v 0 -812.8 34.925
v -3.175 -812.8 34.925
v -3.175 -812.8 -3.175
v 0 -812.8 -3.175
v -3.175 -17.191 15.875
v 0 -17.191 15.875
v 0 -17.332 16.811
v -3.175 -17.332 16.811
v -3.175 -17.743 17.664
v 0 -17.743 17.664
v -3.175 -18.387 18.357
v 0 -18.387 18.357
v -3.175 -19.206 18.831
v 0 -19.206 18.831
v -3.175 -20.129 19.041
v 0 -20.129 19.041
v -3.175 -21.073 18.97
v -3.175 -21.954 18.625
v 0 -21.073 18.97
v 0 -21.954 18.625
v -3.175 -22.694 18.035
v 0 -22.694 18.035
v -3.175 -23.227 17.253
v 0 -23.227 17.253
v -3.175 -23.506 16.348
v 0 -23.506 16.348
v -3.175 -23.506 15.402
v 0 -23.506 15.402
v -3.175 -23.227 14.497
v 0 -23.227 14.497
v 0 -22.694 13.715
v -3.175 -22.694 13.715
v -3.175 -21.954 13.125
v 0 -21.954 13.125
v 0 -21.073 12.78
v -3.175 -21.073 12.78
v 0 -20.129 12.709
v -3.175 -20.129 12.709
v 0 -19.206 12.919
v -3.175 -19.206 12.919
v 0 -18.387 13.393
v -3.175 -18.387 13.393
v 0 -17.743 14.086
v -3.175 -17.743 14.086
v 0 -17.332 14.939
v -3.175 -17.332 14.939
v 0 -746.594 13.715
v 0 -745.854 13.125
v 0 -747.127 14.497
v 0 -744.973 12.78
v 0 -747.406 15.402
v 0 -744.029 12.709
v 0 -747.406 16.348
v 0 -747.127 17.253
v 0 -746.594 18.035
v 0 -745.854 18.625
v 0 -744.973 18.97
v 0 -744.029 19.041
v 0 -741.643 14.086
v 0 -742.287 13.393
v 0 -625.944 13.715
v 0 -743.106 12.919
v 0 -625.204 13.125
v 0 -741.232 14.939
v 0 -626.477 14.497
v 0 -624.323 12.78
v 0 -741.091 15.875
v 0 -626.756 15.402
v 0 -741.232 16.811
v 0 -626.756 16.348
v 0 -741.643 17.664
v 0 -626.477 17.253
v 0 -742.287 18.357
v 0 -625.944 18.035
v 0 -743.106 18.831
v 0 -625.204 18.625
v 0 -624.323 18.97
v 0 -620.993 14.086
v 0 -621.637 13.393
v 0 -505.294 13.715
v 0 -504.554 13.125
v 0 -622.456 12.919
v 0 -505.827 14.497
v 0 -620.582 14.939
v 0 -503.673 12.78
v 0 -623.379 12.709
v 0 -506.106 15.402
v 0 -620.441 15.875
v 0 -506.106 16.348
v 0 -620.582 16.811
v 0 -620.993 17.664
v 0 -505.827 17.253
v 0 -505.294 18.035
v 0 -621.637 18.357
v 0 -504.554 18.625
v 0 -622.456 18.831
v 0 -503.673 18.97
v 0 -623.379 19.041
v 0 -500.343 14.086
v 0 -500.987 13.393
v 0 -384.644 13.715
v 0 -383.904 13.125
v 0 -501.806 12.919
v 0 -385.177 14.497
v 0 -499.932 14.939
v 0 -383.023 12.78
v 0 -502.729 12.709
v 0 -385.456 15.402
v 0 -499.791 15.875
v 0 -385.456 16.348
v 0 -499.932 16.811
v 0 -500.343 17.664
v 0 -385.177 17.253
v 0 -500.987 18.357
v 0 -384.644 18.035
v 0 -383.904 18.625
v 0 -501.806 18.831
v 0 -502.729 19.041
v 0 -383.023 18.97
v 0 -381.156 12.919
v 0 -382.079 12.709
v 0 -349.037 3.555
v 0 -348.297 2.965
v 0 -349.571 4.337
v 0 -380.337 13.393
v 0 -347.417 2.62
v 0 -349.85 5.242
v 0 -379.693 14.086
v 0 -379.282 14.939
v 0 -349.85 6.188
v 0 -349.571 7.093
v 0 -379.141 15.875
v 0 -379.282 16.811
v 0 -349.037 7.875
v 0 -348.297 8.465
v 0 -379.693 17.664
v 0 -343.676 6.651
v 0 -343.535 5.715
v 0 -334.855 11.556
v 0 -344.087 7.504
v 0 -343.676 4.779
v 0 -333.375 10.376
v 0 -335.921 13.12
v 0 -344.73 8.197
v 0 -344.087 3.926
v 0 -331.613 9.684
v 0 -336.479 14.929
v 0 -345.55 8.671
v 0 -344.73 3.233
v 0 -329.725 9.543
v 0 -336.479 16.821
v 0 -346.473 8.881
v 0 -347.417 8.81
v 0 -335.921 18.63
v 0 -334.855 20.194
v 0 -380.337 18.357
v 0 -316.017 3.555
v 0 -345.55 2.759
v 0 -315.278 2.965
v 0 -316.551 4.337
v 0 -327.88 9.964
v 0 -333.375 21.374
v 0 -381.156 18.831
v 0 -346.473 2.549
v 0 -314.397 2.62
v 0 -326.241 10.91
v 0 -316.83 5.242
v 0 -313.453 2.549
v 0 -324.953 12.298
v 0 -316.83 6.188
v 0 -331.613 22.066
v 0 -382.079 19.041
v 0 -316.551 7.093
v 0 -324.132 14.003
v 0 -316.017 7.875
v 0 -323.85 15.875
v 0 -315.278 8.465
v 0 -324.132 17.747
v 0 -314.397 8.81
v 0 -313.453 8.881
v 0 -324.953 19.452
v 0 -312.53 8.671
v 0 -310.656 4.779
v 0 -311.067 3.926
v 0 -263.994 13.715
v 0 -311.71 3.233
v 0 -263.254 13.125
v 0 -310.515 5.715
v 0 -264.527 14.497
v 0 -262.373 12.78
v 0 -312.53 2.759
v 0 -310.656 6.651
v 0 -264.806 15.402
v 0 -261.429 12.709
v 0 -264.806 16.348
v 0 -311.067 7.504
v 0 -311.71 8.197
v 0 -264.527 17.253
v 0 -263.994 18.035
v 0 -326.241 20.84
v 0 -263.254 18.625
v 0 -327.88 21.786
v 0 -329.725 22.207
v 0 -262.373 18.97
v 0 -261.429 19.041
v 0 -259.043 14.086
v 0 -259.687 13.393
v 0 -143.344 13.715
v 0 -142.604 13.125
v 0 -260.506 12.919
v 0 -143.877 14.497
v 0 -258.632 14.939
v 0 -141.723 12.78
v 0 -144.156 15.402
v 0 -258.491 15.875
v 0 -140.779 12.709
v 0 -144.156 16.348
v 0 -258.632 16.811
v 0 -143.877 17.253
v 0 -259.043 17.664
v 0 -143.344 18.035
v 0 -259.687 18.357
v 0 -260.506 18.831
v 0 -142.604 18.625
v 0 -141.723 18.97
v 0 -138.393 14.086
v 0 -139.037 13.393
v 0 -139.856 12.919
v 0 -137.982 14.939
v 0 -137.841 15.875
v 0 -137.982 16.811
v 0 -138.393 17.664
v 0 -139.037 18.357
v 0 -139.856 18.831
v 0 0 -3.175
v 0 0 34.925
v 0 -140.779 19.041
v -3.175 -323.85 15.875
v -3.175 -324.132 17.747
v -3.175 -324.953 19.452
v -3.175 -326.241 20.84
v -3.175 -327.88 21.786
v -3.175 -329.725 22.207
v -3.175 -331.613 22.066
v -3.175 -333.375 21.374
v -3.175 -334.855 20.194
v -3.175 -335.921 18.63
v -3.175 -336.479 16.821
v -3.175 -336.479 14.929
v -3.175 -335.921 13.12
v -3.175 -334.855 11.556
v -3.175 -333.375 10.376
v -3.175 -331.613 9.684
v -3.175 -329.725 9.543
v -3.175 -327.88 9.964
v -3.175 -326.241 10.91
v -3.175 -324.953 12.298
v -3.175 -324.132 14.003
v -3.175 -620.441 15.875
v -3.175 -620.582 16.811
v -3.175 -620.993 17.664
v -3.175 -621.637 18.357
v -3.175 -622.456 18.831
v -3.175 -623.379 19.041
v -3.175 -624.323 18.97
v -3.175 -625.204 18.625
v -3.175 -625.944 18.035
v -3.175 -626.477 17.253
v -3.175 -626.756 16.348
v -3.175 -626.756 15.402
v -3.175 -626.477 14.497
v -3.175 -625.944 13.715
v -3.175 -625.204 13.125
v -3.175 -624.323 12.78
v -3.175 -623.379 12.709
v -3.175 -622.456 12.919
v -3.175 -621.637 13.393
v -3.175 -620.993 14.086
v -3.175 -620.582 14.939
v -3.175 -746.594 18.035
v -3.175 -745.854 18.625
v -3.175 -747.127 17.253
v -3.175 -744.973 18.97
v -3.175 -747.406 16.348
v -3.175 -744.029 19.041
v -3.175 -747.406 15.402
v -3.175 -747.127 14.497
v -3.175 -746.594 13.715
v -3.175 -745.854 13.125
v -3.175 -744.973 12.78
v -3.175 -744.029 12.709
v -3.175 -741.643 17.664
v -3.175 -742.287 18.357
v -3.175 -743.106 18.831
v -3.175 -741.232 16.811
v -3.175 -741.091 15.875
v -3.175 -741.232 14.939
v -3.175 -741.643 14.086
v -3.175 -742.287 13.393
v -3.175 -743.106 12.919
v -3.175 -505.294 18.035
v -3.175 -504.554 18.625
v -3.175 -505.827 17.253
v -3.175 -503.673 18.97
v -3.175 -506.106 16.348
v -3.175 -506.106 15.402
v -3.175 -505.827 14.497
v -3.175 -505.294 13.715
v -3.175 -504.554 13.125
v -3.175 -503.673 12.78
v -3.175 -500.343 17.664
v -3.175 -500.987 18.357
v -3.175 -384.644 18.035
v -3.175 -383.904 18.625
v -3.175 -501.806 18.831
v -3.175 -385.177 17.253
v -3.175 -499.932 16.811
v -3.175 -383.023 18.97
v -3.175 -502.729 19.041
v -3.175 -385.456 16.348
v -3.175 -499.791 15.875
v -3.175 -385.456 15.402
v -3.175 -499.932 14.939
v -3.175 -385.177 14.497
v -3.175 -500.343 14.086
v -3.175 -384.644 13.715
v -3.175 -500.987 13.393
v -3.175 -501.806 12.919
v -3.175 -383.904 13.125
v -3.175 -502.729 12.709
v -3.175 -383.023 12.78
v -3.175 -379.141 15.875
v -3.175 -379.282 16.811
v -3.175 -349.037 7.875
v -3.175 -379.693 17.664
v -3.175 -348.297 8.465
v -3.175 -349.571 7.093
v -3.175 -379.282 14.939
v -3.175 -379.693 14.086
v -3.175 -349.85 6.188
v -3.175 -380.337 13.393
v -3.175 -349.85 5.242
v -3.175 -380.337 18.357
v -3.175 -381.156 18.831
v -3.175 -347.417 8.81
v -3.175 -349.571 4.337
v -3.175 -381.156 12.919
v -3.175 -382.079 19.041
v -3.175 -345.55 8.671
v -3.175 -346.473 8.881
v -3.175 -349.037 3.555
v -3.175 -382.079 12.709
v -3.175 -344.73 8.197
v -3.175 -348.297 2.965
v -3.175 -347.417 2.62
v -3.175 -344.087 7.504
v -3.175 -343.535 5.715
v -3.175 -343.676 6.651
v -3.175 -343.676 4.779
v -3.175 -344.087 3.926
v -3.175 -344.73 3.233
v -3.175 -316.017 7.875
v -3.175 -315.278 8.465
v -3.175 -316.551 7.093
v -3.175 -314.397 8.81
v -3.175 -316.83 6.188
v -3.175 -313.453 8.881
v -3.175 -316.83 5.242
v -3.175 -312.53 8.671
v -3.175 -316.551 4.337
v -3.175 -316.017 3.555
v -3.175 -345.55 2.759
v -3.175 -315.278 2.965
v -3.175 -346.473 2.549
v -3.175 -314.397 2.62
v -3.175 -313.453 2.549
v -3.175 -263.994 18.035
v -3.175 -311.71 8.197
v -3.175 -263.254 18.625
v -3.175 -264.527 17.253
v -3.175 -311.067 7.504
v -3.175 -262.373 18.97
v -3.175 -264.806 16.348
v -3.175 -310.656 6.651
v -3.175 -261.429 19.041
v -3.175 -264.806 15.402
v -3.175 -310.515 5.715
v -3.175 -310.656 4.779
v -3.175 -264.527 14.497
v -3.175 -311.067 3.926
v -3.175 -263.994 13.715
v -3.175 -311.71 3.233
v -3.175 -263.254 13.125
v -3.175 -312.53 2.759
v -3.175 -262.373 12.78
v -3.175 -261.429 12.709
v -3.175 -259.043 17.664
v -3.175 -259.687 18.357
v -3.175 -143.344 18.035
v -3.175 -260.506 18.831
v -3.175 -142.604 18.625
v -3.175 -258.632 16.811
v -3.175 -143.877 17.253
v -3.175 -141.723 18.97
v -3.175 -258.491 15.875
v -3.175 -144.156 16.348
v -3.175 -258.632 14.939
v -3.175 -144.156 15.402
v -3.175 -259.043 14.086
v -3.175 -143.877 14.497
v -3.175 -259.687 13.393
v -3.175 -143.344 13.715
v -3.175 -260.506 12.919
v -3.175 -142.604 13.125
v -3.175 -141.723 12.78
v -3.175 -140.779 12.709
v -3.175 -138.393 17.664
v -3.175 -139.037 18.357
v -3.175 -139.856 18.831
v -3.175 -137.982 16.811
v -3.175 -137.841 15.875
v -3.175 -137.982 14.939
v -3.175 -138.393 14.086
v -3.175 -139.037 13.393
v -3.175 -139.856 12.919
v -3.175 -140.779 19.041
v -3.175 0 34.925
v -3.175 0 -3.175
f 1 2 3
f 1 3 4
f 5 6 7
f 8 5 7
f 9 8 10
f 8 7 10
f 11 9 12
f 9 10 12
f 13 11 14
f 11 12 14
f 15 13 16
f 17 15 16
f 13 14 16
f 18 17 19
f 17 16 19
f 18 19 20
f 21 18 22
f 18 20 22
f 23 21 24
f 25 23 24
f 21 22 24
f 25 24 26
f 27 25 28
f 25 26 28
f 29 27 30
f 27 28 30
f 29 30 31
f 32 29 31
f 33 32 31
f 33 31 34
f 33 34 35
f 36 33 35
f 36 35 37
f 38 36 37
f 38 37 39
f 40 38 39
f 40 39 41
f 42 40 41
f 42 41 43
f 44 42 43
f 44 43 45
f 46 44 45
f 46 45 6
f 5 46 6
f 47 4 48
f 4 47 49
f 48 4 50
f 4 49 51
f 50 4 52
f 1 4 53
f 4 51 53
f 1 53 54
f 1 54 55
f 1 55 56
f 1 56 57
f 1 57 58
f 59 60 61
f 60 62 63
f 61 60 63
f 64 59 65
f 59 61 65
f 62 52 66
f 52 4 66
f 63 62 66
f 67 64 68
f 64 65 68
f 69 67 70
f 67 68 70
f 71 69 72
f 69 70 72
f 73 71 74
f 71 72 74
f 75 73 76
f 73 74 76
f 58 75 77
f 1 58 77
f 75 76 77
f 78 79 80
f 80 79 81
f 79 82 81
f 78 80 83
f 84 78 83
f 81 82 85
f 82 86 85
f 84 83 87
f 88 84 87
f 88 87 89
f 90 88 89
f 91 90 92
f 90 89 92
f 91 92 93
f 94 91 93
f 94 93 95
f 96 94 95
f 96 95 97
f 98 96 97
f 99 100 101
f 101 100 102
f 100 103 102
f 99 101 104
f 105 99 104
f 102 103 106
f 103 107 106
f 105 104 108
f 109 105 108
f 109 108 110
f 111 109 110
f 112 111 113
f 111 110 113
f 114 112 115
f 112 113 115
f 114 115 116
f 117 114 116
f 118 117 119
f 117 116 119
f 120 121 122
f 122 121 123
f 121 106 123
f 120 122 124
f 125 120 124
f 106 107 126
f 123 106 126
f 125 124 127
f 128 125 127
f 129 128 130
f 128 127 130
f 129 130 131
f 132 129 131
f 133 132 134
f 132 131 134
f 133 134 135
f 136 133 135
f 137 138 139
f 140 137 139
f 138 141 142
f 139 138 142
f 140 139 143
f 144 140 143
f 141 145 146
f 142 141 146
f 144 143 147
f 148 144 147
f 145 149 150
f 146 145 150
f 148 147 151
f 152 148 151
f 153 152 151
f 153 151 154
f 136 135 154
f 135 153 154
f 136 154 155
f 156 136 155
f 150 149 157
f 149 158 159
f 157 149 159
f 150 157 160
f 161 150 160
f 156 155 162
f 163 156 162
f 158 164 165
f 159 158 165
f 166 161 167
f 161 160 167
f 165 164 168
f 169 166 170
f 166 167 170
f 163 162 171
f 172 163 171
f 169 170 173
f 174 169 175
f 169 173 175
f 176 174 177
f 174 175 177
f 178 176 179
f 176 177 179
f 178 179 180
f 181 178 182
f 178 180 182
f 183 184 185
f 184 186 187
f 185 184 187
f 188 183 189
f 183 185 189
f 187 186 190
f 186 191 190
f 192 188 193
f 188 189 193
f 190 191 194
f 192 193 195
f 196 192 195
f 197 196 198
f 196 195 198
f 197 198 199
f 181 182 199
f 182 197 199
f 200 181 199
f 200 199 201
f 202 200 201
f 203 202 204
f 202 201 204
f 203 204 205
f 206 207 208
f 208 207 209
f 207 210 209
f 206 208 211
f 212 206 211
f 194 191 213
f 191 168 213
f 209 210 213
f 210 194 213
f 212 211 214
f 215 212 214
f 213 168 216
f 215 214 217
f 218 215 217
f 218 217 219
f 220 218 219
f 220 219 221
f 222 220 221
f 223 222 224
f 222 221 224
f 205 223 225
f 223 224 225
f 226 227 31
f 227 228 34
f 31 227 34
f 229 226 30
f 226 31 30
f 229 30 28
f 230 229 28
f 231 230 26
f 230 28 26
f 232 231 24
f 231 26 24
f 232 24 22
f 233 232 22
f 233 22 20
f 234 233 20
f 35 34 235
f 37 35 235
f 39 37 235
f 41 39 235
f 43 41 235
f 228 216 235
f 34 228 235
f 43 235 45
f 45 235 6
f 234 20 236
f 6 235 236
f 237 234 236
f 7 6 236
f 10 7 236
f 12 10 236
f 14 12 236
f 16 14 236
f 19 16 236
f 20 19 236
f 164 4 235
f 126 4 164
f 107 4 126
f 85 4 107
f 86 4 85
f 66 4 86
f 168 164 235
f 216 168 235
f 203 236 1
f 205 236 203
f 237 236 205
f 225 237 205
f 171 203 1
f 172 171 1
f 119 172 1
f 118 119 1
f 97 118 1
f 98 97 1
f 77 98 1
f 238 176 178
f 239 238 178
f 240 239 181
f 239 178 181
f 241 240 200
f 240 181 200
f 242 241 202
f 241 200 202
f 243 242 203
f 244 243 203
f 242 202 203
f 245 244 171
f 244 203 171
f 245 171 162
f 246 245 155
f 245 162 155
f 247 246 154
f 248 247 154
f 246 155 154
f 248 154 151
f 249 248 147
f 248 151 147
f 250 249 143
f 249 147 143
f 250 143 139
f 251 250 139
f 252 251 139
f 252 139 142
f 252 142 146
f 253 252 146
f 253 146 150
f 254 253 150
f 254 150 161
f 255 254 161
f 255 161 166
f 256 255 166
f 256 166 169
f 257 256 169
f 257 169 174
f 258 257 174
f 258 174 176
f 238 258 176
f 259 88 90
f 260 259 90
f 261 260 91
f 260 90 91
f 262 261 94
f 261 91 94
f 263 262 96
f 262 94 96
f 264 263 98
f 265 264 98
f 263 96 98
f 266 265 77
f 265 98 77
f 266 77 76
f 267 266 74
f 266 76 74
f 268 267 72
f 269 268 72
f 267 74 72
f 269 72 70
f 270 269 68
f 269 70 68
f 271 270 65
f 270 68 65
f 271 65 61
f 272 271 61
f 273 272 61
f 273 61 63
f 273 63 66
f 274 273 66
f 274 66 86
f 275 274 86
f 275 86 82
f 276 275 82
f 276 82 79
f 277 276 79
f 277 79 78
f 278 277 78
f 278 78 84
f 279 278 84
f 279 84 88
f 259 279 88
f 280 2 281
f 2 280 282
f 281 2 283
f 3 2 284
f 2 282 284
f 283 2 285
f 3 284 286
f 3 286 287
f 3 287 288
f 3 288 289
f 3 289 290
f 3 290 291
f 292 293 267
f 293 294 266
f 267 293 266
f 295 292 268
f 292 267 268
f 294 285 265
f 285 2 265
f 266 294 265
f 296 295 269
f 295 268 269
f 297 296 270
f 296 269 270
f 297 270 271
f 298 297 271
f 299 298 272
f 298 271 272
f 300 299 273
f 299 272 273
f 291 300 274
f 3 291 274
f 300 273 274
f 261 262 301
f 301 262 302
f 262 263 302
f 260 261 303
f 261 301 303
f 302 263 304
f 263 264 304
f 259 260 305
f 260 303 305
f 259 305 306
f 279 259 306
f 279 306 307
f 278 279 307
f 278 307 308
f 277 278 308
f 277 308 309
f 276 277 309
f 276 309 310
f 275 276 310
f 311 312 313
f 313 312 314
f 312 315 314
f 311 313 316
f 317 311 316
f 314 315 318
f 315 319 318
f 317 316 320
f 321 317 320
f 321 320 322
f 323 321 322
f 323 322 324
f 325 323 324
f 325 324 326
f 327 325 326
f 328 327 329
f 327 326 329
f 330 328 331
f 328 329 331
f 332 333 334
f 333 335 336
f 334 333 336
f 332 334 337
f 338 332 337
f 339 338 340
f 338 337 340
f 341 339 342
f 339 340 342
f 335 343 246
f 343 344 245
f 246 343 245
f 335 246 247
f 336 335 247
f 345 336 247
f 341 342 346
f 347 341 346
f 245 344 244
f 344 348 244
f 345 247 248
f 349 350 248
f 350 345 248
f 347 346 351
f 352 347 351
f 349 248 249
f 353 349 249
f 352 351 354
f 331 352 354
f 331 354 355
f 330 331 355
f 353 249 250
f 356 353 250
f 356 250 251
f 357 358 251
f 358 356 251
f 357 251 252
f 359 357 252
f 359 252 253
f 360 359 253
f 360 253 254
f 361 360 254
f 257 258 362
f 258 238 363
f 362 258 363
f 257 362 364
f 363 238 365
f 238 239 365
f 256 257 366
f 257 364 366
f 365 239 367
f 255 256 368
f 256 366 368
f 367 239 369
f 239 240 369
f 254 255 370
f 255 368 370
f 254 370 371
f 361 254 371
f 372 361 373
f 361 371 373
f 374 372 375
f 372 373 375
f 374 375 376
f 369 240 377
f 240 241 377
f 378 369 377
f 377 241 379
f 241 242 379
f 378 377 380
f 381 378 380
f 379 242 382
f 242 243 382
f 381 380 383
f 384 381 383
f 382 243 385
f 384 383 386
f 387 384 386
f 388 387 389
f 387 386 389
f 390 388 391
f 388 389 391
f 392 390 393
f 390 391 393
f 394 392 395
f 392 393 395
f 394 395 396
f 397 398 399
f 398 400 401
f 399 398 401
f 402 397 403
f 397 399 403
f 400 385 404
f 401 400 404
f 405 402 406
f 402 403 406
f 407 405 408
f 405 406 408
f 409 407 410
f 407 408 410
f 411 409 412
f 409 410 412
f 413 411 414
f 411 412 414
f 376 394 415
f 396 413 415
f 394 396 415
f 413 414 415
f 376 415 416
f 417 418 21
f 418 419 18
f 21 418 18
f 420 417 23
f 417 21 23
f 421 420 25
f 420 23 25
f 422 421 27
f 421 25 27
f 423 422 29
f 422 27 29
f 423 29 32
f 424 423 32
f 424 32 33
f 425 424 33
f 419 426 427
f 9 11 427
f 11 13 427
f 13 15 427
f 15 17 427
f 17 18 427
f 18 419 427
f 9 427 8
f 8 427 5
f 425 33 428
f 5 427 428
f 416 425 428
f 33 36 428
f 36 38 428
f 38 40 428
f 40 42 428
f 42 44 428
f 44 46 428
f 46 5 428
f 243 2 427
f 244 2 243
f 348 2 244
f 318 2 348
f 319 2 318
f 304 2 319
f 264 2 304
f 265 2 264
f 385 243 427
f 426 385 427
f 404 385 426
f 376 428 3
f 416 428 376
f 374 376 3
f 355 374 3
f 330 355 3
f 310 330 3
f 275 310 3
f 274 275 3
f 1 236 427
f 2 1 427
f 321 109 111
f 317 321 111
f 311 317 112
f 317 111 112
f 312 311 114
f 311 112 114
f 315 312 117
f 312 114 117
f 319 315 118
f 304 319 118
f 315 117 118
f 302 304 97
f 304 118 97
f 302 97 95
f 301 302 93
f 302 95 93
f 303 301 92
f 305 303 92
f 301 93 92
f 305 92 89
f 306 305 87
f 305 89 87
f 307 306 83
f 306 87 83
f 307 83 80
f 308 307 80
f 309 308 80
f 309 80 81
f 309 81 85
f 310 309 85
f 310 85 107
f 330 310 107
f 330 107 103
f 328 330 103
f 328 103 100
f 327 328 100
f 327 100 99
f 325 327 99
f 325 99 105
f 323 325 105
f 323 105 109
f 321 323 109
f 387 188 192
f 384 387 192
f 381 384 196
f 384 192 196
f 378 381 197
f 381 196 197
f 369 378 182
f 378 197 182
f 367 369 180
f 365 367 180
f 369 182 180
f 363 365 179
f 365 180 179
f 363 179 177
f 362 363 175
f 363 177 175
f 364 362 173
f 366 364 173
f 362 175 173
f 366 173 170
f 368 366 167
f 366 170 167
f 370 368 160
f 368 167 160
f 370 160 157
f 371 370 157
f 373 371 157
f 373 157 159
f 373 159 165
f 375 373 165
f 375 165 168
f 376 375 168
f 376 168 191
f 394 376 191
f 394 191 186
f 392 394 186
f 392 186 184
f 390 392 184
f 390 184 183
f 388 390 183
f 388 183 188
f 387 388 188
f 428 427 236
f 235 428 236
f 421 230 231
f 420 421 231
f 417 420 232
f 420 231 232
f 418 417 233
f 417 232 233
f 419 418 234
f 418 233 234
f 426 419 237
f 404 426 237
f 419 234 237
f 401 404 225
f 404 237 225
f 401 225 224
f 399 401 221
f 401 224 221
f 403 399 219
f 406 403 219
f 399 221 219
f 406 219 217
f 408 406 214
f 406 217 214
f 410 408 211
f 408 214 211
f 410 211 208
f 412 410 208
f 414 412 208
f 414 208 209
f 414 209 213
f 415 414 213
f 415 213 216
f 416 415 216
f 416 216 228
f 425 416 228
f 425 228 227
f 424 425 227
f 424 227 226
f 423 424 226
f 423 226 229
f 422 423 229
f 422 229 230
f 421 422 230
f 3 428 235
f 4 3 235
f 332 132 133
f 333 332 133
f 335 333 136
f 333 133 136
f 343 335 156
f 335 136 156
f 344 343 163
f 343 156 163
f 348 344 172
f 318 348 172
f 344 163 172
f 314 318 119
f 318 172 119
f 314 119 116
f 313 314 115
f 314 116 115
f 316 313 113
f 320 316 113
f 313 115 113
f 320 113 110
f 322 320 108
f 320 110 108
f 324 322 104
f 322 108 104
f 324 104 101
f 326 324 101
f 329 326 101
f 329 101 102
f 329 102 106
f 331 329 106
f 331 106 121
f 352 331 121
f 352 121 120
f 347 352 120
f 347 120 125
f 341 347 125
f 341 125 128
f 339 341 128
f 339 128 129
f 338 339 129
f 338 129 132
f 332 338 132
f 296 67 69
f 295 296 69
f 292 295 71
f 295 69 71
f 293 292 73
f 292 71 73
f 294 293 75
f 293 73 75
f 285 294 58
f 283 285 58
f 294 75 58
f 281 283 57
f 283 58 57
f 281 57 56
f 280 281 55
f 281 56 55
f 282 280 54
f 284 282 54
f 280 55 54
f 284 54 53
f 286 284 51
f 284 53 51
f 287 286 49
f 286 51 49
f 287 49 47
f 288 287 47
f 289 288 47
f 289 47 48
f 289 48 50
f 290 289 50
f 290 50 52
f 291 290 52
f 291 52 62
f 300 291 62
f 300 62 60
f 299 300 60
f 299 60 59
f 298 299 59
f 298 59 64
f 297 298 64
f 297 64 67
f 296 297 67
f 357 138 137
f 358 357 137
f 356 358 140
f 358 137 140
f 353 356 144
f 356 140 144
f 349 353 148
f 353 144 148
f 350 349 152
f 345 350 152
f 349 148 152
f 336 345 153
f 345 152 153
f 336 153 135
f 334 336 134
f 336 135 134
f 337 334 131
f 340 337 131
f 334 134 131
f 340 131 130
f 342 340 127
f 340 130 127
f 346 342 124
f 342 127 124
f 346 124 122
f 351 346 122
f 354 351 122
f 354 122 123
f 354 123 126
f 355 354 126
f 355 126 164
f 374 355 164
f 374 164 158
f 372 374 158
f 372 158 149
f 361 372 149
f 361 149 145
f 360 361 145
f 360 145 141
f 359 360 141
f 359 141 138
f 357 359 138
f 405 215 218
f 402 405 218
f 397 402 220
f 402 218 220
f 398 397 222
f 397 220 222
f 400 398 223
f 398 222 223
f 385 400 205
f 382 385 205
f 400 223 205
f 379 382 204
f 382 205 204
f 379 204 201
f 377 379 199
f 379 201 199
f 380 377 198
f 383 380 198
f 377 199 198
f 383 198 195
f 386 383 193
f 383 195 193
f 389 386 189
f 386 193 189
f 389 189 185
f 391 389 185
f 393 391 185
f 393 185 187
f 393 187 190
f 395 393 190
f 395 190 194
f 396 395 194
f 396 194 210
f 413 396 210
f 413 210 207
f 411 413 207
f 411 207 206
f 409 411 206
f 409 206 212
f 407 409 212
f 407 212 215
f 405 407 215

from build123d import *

# Parameters (mm, degrees)
F1_DEPTH = 812.8
F2_R     = 6.35
F2_R_2   = 3.175
F3_DEPTH = 25.4
F4_R     = 3.175
F5_DEPTH = 25.4


with BuildPart() as f1:
    # F0 (on Front) → F1 (new body)
    with BuildSketch(Plane.XZ):
        Polygon((0, -3.175), (0, 0), (0, 34.925), (-3.175, 34.925), (-3.175, -3.175), align=None)
    extrude(amount=F1_DEPTH)

    # F2 (on face) → F3 (cut)
    with BuildSketch(Plane.YZ):
        with Locations((-330.2, 15.875)):
            Circle(F2_R)
        with Locations((-346.71, 5.715)):
            Circle(F2_R_2)
        with Locations((-313.69, 5.715)):
            Circle(F2_R_2)
    extrude(amount=-F3_DEPTH, mode=Mode.SUBTRACT)

    # F4 (on face) → F5 (cut)
    with BuildSketch(Plane.YZ):
        with Locations((-20.366231, 15.875)):
            Circle(F4_R)
        with Locations((-141.016231, 15.875)):
            Circle(F4_R)
        with Locations((-261.666231, 15.875)):
            Circle(F4_R)
        with Locations((-382.316231, 15.875)):
            Circle(F4_R)
        with Locations((-502.966231, 15.875)):
            Circle(F4_R)
        with Locations((-623.616231, 15.875)):
            Circle(F4_R)
        with Locations((-744.266231, 15.875)):
            Circle(F4_R)
    extrude(amount=-F5_DEPTH, mode=Mode.SUBTRACT)


solid = f1.part
